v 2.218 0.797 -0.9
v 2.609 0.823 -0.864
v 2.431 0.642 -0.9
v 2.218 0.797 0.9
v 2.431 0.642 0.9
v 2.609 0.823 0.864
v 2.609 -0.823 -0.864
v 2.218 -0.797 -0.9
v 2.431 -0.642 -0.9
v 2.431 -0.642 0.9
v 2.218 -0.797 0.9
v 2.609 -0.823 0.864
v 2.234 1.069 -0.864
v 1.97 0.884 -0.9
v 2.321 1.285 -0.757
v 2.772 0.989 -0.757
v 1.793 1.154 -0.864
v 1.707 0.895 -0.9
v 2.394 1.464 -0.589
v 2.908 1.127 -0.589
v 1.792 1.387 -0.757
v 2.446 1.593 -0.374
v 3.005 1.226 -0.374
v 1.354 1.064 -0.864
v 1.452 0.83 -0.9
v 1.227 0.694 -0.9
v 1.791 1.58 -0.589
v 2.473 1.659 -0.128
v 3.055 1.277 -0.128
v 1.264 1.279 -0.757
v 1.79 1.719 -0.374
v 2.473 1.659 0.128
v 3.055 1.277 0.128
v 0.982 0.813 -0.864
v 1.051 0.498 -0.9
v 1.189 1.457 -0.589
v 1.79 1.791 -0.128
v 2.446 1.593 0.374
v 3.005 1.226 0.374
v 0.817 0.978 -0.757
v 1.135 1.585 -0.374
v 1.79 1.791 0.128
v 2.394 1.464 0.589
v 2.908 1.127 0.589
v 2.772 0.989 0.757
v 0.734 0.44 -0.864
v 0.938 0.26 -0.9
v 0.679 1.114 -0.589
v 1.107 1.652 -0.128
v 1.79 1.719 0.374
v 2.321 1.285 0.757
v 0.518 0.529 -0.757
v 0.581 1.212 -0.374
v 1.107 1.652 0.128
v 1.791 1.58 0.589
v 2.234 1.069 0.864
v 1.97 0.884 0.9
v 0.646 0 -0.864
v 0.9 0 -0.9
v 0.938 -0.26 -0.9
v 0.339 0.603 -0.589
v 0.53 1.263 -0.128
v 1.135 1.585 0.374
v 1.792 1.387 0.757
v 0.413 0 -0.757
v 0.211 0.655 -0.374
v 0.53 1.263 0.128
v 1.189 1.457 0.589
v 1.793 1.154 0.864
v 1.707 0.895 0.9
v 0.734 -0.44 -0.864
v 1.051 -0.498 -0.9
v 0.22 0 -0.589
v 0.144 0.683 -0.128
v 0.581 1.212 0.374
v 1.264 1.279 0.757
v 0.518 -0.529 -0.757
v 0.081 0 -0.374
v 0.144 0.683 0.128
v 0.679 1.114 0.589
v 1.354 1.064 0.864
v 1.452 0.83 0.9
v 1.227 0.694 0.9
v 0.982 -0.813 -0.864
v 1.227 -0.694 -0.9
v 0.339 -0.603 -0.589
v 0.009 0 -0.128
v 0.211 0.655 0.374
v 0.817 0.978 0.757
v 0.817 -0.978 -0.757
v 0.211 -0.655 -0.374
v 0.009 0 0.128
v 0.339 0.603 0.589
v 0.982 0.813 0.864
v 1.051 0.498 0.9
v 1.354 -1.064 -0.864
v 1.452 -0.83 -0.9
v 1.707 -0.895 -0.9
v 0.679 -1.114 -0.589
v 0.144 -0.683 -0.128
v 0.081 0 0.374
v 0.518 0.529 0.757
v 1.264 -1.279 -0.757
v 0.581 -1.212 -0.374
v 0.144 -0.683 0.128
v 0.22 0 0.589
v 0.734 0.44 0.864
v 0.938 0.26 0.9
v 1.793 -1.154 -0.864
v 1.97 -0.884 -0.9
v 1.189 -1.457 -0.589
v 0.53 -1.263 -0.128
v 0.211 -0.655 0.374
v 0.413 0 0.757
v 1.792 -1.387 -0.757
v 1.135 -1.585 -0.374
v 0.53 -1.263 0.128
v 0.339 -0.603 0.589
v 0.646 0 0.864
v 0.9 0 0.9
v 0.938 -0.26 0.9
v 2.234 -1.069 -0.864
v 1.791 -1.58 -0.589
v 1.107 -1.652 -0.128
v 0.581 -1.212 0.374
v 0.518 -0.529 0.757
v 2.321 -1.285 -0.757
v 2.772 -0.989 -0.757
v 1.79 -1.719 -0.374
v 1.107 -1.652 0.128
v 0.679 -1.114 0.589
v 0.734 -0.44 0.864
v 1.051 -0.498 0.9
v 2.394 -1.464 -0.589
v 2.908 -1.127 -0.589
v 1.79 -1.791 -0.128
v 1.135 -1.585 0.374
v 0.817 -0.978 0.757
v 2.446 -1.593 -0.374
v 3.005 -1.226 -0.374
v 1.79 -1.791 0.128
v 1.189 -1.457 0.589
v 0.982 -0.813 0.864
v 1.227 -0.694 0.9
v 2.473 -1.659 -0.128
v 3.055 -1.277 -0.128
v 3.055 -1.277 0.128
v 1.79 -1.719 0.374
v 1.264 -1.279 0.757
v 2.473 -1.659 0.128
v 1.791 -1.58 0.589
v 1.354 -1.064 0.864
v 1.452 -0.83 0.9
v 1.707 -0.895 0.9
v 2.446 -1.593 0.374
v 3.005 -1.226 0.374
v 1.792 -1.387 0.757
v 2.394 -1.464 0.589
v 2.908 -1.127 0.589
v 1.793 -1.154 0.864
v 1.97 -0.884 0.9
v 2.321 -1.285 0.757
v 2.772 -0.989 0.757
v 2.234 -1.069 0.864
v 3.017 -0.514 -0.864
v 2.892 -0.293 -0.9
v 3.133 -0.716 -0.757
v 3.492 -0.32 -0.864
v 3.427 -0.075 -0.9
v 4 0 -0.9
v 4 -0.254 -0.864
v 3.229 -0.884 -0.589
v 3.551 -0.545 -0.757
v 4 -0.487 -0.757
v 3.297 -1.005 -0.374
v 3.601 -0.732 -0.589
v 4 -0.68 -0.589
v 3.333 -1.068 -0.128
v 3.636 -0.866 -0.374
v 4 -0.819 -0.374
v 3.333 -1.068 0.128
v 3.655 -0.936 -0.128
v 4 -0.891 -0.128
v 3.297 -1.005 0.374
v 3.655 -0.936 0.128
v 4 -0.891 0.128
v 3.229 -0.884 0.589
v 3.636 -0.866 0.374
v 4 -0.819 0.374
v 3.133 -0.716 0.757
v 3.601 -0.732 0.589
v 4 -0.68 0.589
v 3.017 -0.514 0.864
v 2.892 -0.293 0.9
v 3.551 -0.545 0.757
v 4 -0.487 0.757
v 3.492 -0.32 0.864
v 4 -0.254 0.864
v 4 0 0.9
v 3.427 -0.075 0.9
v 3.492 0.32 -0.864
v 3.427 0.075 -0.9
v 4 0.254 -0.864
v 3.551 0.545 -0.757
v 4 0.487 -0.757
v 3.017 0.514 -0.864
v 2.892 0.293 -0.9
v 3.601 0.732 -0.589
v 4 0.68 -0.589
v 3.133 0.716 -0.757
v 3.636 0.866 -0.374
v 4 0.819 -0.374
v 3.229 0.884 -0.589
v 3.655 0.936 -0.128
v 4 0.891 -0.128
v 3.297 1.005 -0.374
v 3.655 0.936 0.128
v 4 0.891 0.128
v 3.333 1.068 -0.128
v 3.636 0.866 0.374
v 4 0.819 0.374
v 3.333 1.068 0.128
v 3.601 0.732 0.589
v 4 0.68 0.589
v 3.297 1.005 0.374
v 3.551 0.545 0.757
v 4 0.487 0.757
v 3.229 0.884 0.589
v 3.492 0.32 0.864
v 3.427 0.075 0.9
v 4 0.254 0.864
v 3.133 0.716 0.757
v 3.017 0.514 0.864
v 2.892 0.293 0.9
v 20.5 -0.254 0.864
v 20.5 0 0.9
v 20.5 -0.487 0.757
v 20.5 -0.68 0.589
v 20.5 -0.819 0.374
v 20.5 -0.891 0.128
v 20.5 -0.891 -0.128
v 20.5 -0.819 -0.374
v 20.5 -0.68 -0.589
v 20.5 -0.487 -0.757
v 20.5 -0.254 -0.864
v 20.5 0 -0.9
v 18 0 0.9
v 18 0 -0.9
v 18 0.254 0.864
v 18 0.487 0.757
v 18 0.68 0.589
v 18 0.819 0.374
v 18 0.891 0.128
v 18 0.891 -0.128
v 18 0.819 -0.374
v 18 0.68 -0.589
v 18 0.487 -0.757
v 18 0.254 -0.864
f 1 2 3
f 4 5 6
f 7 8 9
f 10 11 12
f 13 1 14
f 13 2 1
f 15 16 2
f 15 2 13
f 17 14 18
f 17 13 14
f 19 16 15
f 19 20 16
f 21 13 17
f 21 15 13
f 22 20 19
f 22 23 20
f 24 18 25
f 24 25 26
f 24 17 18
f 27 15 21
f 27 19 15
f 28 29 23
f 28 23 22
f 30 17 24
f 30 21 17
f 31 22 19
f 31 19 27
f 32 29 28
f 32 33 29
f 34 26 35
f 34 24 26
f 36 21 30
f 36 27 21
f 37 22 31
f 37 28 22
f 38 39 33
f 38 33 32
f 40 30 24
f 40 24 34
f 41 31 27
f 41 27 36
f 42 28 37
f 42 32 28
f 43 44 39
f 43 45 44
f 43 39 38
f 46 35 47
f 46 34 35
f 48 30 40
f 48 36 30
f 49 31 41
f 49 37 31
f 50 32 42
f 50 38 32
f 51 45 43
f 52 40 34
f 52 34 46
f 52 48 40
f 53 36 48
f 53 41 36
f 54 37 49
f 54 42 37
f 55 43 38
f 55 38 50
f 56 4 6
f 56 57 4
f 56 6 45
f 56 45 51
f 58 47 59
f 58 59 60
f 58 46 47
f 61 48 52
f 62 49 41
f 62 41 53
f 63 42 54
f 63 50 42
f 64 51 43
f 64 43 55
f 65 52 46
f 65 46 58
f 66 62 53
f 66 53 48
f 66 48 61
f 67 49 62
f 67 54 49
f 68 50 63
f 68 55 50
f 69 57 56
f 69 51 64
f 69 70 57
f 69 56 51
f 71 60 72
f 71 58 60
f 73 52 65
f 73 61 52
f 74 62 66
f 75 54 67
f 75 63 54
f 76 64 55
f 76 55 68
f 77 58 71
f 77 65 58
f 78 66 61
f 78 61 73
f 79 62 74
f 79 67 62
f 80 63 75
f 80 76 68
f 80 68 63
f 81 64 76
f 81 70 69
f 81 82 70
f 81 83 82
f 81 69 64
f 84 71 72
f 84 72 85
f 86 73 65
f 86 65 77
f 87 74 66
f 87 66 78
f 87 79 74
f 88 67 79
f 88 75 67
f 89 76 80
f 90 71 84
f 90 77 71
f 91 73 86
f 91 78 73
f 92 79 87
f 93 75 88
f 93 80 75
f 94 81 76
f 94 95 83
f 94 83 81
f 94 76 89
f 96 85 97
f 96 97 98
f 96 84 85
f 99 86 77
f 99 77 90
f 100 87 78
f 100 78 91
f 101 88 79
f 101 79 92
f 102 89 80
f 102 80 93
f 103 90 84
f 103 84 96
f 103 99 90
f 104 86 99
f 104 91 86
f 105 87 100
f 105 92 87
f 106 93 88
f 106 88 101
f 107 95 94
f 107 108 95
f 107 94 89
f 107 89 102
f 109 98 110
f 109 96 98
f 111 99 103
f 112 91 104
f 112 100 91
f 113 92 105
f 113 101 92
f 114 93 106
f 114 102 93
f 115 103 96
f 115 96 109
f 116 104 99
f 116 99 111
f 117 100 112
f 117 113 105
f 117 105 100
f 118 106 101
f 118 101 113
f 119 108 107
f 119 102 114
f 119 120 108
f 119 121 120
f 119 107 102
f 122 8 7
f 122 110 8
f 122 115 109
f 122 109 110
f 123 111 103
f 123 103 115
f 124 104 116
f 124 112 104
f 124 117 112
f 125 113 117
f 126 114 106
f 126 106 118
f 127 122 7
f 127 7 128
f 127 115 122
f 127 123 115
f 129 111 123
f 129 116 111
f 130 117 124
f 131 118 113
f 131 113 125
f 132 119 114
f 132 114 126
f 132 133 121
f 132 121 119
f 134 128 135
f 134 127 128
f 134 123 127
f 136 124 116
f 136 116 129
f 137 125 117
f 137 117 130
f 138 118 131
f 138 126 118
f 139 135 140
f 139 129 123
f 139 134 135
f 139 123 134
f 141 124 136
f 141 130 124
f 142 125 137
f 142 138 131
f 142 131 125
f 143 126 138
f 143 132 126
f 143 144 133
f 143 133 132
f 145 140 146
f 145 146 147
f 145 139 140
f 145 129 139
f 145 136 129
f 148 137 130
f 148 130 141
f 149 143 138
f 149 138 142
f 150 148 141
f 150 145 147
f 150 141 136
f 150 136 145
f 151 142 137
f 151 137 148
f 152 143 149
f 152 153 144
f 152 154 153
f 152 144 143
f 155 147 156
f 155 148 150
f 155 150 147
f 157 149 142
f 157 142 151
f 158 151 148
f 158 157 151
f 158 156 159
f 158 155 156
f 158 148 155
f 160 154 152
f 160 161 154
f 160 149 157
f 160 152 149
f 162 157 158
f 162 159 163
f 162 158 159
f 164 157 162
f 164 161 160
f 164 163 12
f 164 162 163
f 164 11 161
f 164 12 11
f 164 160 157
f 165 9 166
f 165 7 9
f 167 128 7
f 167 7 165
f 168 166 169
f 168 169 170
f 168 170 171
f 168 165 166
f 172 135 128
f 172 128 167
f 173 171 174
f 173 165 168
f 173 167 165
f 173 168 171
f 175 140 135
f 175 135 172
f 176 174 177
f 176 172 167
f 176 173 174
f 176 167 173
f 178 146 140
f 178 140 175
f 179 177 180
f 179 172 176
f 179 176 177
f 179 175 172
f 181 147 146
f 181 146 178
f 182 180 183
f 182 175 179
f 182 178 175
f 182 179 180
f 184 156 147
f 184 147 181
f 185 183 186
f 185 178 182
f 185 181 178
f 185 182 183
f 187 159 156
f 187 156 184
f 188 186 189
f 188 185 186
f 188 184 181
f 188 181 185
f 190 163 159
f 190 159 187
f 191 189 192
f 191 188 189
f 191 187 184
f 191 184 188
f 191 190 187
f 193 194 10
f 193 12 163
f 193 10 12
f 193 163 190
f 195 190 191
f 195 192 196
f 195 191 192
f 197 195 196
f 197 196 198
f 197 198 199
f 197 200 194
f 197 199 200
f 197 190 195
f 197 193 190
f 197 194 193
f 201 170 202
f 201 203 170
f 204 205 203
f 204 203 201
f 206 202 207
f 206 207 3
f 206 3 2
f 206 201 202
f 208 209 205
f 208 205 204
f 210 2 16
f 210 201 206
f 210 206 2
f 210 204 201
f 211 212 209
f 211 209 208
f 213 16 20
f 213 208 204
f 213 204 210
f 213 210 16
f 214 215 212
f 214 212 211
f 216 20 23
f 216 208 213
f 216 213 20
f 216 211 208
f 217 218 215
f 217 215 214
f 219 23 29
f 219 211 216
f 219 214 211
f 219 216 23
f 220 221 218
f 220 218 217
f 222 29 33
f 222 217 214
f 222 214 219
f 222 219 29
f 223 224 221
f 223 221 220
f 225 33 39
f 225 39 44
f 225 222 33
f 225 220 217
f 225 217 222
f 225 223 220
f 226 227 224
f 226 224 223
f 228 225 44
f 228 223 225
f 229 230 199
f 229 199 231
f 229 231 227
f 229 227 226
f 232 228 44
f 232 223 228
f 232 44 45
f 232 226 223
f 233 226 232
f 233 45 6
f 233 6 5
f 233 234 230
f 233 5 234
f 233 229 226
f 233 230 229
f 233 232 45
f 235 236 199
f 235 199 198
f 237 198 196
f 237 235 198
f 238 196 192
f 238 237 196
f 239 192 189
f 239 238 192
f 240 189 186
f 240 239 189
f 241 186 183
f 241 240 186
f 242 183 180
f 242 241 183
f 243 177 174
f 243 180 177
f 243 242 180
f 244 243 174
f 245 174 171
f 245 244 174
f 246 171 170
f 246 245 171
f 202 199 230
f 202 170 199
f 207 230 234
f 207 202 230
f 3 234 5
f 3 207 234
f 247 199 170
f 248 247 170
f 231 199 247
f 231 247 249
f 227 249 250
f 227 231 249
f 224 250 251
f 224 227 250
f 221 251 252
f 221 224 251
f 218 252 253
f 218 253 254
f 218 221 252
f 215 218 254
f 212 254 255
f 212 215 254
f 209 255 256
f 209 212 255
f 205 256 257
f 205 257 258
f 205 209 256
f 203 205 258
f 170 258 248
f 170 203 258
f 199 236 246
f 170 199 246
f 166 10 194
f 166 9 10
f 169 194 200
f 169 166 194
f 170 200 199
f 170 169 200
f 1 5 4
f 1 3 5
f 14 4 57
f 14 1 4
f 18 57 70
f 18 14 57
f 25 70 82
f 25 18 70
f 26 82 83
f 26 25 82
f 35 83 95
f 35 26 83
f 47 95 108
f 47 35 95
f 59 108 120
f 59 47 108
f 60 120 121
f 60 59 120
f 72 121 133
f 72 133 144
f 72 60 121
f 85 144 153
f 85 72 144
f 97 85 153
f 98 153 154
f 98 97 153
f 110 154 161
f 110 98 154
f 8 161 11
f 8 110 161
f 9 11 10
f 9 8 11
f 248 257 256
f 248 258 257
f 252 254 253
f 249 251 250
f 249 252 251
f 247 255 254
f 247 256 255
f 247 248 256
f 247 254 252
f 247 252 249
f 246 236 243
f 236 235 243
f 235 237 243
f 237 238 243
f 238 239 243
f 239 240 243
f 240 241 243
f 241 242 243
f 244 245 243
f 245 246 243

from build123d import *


with BuildPart() as part:
    # Body: sweep along a path in PathSke
    with BuildLine(Plane(origin=(1.207969362, 1.807969362, 0), x_dir=(0, 1, 0), z_dir=(0, 0, 1))) as body_path:
        Line((-0.907969362, -16.792030638), (-0.907969362, -2.792030638))
        ThreePointArc((-0.907969362, -2.792030638), (-0.808285009, -2.285083328), (-0.524075557, -1.853623558))
        ThreePointArc((-0.524075557, -1.853623558), (-1.807969362, 1.207969362), (-3.091863167, -1.853623558))
        ThreePointArc((-3.091863167, -1.853623558), (-2.807653715, -2.285083328), (-2.707969362, -2.792030638))
        Line((-2.707969362, -2.792030638), (-2.707969362, -19.292030638))
    # SectionSke → Body (sweep)
    with BuildSketch(Plane(origin=(18, 0.15, 0.15), x_dir=(0, 1, 0), z_dir=(1, 0, 0))):
        with BuildLine():
            Line((-0.15, -1.05), (-0.15, 0.75))
            ThreePointArc((-0.15, 0.75), (0.75, -0.15), (-0.15, -1.05))
        make_face()
    sweep(path=body_path.line)


solid = part.part
